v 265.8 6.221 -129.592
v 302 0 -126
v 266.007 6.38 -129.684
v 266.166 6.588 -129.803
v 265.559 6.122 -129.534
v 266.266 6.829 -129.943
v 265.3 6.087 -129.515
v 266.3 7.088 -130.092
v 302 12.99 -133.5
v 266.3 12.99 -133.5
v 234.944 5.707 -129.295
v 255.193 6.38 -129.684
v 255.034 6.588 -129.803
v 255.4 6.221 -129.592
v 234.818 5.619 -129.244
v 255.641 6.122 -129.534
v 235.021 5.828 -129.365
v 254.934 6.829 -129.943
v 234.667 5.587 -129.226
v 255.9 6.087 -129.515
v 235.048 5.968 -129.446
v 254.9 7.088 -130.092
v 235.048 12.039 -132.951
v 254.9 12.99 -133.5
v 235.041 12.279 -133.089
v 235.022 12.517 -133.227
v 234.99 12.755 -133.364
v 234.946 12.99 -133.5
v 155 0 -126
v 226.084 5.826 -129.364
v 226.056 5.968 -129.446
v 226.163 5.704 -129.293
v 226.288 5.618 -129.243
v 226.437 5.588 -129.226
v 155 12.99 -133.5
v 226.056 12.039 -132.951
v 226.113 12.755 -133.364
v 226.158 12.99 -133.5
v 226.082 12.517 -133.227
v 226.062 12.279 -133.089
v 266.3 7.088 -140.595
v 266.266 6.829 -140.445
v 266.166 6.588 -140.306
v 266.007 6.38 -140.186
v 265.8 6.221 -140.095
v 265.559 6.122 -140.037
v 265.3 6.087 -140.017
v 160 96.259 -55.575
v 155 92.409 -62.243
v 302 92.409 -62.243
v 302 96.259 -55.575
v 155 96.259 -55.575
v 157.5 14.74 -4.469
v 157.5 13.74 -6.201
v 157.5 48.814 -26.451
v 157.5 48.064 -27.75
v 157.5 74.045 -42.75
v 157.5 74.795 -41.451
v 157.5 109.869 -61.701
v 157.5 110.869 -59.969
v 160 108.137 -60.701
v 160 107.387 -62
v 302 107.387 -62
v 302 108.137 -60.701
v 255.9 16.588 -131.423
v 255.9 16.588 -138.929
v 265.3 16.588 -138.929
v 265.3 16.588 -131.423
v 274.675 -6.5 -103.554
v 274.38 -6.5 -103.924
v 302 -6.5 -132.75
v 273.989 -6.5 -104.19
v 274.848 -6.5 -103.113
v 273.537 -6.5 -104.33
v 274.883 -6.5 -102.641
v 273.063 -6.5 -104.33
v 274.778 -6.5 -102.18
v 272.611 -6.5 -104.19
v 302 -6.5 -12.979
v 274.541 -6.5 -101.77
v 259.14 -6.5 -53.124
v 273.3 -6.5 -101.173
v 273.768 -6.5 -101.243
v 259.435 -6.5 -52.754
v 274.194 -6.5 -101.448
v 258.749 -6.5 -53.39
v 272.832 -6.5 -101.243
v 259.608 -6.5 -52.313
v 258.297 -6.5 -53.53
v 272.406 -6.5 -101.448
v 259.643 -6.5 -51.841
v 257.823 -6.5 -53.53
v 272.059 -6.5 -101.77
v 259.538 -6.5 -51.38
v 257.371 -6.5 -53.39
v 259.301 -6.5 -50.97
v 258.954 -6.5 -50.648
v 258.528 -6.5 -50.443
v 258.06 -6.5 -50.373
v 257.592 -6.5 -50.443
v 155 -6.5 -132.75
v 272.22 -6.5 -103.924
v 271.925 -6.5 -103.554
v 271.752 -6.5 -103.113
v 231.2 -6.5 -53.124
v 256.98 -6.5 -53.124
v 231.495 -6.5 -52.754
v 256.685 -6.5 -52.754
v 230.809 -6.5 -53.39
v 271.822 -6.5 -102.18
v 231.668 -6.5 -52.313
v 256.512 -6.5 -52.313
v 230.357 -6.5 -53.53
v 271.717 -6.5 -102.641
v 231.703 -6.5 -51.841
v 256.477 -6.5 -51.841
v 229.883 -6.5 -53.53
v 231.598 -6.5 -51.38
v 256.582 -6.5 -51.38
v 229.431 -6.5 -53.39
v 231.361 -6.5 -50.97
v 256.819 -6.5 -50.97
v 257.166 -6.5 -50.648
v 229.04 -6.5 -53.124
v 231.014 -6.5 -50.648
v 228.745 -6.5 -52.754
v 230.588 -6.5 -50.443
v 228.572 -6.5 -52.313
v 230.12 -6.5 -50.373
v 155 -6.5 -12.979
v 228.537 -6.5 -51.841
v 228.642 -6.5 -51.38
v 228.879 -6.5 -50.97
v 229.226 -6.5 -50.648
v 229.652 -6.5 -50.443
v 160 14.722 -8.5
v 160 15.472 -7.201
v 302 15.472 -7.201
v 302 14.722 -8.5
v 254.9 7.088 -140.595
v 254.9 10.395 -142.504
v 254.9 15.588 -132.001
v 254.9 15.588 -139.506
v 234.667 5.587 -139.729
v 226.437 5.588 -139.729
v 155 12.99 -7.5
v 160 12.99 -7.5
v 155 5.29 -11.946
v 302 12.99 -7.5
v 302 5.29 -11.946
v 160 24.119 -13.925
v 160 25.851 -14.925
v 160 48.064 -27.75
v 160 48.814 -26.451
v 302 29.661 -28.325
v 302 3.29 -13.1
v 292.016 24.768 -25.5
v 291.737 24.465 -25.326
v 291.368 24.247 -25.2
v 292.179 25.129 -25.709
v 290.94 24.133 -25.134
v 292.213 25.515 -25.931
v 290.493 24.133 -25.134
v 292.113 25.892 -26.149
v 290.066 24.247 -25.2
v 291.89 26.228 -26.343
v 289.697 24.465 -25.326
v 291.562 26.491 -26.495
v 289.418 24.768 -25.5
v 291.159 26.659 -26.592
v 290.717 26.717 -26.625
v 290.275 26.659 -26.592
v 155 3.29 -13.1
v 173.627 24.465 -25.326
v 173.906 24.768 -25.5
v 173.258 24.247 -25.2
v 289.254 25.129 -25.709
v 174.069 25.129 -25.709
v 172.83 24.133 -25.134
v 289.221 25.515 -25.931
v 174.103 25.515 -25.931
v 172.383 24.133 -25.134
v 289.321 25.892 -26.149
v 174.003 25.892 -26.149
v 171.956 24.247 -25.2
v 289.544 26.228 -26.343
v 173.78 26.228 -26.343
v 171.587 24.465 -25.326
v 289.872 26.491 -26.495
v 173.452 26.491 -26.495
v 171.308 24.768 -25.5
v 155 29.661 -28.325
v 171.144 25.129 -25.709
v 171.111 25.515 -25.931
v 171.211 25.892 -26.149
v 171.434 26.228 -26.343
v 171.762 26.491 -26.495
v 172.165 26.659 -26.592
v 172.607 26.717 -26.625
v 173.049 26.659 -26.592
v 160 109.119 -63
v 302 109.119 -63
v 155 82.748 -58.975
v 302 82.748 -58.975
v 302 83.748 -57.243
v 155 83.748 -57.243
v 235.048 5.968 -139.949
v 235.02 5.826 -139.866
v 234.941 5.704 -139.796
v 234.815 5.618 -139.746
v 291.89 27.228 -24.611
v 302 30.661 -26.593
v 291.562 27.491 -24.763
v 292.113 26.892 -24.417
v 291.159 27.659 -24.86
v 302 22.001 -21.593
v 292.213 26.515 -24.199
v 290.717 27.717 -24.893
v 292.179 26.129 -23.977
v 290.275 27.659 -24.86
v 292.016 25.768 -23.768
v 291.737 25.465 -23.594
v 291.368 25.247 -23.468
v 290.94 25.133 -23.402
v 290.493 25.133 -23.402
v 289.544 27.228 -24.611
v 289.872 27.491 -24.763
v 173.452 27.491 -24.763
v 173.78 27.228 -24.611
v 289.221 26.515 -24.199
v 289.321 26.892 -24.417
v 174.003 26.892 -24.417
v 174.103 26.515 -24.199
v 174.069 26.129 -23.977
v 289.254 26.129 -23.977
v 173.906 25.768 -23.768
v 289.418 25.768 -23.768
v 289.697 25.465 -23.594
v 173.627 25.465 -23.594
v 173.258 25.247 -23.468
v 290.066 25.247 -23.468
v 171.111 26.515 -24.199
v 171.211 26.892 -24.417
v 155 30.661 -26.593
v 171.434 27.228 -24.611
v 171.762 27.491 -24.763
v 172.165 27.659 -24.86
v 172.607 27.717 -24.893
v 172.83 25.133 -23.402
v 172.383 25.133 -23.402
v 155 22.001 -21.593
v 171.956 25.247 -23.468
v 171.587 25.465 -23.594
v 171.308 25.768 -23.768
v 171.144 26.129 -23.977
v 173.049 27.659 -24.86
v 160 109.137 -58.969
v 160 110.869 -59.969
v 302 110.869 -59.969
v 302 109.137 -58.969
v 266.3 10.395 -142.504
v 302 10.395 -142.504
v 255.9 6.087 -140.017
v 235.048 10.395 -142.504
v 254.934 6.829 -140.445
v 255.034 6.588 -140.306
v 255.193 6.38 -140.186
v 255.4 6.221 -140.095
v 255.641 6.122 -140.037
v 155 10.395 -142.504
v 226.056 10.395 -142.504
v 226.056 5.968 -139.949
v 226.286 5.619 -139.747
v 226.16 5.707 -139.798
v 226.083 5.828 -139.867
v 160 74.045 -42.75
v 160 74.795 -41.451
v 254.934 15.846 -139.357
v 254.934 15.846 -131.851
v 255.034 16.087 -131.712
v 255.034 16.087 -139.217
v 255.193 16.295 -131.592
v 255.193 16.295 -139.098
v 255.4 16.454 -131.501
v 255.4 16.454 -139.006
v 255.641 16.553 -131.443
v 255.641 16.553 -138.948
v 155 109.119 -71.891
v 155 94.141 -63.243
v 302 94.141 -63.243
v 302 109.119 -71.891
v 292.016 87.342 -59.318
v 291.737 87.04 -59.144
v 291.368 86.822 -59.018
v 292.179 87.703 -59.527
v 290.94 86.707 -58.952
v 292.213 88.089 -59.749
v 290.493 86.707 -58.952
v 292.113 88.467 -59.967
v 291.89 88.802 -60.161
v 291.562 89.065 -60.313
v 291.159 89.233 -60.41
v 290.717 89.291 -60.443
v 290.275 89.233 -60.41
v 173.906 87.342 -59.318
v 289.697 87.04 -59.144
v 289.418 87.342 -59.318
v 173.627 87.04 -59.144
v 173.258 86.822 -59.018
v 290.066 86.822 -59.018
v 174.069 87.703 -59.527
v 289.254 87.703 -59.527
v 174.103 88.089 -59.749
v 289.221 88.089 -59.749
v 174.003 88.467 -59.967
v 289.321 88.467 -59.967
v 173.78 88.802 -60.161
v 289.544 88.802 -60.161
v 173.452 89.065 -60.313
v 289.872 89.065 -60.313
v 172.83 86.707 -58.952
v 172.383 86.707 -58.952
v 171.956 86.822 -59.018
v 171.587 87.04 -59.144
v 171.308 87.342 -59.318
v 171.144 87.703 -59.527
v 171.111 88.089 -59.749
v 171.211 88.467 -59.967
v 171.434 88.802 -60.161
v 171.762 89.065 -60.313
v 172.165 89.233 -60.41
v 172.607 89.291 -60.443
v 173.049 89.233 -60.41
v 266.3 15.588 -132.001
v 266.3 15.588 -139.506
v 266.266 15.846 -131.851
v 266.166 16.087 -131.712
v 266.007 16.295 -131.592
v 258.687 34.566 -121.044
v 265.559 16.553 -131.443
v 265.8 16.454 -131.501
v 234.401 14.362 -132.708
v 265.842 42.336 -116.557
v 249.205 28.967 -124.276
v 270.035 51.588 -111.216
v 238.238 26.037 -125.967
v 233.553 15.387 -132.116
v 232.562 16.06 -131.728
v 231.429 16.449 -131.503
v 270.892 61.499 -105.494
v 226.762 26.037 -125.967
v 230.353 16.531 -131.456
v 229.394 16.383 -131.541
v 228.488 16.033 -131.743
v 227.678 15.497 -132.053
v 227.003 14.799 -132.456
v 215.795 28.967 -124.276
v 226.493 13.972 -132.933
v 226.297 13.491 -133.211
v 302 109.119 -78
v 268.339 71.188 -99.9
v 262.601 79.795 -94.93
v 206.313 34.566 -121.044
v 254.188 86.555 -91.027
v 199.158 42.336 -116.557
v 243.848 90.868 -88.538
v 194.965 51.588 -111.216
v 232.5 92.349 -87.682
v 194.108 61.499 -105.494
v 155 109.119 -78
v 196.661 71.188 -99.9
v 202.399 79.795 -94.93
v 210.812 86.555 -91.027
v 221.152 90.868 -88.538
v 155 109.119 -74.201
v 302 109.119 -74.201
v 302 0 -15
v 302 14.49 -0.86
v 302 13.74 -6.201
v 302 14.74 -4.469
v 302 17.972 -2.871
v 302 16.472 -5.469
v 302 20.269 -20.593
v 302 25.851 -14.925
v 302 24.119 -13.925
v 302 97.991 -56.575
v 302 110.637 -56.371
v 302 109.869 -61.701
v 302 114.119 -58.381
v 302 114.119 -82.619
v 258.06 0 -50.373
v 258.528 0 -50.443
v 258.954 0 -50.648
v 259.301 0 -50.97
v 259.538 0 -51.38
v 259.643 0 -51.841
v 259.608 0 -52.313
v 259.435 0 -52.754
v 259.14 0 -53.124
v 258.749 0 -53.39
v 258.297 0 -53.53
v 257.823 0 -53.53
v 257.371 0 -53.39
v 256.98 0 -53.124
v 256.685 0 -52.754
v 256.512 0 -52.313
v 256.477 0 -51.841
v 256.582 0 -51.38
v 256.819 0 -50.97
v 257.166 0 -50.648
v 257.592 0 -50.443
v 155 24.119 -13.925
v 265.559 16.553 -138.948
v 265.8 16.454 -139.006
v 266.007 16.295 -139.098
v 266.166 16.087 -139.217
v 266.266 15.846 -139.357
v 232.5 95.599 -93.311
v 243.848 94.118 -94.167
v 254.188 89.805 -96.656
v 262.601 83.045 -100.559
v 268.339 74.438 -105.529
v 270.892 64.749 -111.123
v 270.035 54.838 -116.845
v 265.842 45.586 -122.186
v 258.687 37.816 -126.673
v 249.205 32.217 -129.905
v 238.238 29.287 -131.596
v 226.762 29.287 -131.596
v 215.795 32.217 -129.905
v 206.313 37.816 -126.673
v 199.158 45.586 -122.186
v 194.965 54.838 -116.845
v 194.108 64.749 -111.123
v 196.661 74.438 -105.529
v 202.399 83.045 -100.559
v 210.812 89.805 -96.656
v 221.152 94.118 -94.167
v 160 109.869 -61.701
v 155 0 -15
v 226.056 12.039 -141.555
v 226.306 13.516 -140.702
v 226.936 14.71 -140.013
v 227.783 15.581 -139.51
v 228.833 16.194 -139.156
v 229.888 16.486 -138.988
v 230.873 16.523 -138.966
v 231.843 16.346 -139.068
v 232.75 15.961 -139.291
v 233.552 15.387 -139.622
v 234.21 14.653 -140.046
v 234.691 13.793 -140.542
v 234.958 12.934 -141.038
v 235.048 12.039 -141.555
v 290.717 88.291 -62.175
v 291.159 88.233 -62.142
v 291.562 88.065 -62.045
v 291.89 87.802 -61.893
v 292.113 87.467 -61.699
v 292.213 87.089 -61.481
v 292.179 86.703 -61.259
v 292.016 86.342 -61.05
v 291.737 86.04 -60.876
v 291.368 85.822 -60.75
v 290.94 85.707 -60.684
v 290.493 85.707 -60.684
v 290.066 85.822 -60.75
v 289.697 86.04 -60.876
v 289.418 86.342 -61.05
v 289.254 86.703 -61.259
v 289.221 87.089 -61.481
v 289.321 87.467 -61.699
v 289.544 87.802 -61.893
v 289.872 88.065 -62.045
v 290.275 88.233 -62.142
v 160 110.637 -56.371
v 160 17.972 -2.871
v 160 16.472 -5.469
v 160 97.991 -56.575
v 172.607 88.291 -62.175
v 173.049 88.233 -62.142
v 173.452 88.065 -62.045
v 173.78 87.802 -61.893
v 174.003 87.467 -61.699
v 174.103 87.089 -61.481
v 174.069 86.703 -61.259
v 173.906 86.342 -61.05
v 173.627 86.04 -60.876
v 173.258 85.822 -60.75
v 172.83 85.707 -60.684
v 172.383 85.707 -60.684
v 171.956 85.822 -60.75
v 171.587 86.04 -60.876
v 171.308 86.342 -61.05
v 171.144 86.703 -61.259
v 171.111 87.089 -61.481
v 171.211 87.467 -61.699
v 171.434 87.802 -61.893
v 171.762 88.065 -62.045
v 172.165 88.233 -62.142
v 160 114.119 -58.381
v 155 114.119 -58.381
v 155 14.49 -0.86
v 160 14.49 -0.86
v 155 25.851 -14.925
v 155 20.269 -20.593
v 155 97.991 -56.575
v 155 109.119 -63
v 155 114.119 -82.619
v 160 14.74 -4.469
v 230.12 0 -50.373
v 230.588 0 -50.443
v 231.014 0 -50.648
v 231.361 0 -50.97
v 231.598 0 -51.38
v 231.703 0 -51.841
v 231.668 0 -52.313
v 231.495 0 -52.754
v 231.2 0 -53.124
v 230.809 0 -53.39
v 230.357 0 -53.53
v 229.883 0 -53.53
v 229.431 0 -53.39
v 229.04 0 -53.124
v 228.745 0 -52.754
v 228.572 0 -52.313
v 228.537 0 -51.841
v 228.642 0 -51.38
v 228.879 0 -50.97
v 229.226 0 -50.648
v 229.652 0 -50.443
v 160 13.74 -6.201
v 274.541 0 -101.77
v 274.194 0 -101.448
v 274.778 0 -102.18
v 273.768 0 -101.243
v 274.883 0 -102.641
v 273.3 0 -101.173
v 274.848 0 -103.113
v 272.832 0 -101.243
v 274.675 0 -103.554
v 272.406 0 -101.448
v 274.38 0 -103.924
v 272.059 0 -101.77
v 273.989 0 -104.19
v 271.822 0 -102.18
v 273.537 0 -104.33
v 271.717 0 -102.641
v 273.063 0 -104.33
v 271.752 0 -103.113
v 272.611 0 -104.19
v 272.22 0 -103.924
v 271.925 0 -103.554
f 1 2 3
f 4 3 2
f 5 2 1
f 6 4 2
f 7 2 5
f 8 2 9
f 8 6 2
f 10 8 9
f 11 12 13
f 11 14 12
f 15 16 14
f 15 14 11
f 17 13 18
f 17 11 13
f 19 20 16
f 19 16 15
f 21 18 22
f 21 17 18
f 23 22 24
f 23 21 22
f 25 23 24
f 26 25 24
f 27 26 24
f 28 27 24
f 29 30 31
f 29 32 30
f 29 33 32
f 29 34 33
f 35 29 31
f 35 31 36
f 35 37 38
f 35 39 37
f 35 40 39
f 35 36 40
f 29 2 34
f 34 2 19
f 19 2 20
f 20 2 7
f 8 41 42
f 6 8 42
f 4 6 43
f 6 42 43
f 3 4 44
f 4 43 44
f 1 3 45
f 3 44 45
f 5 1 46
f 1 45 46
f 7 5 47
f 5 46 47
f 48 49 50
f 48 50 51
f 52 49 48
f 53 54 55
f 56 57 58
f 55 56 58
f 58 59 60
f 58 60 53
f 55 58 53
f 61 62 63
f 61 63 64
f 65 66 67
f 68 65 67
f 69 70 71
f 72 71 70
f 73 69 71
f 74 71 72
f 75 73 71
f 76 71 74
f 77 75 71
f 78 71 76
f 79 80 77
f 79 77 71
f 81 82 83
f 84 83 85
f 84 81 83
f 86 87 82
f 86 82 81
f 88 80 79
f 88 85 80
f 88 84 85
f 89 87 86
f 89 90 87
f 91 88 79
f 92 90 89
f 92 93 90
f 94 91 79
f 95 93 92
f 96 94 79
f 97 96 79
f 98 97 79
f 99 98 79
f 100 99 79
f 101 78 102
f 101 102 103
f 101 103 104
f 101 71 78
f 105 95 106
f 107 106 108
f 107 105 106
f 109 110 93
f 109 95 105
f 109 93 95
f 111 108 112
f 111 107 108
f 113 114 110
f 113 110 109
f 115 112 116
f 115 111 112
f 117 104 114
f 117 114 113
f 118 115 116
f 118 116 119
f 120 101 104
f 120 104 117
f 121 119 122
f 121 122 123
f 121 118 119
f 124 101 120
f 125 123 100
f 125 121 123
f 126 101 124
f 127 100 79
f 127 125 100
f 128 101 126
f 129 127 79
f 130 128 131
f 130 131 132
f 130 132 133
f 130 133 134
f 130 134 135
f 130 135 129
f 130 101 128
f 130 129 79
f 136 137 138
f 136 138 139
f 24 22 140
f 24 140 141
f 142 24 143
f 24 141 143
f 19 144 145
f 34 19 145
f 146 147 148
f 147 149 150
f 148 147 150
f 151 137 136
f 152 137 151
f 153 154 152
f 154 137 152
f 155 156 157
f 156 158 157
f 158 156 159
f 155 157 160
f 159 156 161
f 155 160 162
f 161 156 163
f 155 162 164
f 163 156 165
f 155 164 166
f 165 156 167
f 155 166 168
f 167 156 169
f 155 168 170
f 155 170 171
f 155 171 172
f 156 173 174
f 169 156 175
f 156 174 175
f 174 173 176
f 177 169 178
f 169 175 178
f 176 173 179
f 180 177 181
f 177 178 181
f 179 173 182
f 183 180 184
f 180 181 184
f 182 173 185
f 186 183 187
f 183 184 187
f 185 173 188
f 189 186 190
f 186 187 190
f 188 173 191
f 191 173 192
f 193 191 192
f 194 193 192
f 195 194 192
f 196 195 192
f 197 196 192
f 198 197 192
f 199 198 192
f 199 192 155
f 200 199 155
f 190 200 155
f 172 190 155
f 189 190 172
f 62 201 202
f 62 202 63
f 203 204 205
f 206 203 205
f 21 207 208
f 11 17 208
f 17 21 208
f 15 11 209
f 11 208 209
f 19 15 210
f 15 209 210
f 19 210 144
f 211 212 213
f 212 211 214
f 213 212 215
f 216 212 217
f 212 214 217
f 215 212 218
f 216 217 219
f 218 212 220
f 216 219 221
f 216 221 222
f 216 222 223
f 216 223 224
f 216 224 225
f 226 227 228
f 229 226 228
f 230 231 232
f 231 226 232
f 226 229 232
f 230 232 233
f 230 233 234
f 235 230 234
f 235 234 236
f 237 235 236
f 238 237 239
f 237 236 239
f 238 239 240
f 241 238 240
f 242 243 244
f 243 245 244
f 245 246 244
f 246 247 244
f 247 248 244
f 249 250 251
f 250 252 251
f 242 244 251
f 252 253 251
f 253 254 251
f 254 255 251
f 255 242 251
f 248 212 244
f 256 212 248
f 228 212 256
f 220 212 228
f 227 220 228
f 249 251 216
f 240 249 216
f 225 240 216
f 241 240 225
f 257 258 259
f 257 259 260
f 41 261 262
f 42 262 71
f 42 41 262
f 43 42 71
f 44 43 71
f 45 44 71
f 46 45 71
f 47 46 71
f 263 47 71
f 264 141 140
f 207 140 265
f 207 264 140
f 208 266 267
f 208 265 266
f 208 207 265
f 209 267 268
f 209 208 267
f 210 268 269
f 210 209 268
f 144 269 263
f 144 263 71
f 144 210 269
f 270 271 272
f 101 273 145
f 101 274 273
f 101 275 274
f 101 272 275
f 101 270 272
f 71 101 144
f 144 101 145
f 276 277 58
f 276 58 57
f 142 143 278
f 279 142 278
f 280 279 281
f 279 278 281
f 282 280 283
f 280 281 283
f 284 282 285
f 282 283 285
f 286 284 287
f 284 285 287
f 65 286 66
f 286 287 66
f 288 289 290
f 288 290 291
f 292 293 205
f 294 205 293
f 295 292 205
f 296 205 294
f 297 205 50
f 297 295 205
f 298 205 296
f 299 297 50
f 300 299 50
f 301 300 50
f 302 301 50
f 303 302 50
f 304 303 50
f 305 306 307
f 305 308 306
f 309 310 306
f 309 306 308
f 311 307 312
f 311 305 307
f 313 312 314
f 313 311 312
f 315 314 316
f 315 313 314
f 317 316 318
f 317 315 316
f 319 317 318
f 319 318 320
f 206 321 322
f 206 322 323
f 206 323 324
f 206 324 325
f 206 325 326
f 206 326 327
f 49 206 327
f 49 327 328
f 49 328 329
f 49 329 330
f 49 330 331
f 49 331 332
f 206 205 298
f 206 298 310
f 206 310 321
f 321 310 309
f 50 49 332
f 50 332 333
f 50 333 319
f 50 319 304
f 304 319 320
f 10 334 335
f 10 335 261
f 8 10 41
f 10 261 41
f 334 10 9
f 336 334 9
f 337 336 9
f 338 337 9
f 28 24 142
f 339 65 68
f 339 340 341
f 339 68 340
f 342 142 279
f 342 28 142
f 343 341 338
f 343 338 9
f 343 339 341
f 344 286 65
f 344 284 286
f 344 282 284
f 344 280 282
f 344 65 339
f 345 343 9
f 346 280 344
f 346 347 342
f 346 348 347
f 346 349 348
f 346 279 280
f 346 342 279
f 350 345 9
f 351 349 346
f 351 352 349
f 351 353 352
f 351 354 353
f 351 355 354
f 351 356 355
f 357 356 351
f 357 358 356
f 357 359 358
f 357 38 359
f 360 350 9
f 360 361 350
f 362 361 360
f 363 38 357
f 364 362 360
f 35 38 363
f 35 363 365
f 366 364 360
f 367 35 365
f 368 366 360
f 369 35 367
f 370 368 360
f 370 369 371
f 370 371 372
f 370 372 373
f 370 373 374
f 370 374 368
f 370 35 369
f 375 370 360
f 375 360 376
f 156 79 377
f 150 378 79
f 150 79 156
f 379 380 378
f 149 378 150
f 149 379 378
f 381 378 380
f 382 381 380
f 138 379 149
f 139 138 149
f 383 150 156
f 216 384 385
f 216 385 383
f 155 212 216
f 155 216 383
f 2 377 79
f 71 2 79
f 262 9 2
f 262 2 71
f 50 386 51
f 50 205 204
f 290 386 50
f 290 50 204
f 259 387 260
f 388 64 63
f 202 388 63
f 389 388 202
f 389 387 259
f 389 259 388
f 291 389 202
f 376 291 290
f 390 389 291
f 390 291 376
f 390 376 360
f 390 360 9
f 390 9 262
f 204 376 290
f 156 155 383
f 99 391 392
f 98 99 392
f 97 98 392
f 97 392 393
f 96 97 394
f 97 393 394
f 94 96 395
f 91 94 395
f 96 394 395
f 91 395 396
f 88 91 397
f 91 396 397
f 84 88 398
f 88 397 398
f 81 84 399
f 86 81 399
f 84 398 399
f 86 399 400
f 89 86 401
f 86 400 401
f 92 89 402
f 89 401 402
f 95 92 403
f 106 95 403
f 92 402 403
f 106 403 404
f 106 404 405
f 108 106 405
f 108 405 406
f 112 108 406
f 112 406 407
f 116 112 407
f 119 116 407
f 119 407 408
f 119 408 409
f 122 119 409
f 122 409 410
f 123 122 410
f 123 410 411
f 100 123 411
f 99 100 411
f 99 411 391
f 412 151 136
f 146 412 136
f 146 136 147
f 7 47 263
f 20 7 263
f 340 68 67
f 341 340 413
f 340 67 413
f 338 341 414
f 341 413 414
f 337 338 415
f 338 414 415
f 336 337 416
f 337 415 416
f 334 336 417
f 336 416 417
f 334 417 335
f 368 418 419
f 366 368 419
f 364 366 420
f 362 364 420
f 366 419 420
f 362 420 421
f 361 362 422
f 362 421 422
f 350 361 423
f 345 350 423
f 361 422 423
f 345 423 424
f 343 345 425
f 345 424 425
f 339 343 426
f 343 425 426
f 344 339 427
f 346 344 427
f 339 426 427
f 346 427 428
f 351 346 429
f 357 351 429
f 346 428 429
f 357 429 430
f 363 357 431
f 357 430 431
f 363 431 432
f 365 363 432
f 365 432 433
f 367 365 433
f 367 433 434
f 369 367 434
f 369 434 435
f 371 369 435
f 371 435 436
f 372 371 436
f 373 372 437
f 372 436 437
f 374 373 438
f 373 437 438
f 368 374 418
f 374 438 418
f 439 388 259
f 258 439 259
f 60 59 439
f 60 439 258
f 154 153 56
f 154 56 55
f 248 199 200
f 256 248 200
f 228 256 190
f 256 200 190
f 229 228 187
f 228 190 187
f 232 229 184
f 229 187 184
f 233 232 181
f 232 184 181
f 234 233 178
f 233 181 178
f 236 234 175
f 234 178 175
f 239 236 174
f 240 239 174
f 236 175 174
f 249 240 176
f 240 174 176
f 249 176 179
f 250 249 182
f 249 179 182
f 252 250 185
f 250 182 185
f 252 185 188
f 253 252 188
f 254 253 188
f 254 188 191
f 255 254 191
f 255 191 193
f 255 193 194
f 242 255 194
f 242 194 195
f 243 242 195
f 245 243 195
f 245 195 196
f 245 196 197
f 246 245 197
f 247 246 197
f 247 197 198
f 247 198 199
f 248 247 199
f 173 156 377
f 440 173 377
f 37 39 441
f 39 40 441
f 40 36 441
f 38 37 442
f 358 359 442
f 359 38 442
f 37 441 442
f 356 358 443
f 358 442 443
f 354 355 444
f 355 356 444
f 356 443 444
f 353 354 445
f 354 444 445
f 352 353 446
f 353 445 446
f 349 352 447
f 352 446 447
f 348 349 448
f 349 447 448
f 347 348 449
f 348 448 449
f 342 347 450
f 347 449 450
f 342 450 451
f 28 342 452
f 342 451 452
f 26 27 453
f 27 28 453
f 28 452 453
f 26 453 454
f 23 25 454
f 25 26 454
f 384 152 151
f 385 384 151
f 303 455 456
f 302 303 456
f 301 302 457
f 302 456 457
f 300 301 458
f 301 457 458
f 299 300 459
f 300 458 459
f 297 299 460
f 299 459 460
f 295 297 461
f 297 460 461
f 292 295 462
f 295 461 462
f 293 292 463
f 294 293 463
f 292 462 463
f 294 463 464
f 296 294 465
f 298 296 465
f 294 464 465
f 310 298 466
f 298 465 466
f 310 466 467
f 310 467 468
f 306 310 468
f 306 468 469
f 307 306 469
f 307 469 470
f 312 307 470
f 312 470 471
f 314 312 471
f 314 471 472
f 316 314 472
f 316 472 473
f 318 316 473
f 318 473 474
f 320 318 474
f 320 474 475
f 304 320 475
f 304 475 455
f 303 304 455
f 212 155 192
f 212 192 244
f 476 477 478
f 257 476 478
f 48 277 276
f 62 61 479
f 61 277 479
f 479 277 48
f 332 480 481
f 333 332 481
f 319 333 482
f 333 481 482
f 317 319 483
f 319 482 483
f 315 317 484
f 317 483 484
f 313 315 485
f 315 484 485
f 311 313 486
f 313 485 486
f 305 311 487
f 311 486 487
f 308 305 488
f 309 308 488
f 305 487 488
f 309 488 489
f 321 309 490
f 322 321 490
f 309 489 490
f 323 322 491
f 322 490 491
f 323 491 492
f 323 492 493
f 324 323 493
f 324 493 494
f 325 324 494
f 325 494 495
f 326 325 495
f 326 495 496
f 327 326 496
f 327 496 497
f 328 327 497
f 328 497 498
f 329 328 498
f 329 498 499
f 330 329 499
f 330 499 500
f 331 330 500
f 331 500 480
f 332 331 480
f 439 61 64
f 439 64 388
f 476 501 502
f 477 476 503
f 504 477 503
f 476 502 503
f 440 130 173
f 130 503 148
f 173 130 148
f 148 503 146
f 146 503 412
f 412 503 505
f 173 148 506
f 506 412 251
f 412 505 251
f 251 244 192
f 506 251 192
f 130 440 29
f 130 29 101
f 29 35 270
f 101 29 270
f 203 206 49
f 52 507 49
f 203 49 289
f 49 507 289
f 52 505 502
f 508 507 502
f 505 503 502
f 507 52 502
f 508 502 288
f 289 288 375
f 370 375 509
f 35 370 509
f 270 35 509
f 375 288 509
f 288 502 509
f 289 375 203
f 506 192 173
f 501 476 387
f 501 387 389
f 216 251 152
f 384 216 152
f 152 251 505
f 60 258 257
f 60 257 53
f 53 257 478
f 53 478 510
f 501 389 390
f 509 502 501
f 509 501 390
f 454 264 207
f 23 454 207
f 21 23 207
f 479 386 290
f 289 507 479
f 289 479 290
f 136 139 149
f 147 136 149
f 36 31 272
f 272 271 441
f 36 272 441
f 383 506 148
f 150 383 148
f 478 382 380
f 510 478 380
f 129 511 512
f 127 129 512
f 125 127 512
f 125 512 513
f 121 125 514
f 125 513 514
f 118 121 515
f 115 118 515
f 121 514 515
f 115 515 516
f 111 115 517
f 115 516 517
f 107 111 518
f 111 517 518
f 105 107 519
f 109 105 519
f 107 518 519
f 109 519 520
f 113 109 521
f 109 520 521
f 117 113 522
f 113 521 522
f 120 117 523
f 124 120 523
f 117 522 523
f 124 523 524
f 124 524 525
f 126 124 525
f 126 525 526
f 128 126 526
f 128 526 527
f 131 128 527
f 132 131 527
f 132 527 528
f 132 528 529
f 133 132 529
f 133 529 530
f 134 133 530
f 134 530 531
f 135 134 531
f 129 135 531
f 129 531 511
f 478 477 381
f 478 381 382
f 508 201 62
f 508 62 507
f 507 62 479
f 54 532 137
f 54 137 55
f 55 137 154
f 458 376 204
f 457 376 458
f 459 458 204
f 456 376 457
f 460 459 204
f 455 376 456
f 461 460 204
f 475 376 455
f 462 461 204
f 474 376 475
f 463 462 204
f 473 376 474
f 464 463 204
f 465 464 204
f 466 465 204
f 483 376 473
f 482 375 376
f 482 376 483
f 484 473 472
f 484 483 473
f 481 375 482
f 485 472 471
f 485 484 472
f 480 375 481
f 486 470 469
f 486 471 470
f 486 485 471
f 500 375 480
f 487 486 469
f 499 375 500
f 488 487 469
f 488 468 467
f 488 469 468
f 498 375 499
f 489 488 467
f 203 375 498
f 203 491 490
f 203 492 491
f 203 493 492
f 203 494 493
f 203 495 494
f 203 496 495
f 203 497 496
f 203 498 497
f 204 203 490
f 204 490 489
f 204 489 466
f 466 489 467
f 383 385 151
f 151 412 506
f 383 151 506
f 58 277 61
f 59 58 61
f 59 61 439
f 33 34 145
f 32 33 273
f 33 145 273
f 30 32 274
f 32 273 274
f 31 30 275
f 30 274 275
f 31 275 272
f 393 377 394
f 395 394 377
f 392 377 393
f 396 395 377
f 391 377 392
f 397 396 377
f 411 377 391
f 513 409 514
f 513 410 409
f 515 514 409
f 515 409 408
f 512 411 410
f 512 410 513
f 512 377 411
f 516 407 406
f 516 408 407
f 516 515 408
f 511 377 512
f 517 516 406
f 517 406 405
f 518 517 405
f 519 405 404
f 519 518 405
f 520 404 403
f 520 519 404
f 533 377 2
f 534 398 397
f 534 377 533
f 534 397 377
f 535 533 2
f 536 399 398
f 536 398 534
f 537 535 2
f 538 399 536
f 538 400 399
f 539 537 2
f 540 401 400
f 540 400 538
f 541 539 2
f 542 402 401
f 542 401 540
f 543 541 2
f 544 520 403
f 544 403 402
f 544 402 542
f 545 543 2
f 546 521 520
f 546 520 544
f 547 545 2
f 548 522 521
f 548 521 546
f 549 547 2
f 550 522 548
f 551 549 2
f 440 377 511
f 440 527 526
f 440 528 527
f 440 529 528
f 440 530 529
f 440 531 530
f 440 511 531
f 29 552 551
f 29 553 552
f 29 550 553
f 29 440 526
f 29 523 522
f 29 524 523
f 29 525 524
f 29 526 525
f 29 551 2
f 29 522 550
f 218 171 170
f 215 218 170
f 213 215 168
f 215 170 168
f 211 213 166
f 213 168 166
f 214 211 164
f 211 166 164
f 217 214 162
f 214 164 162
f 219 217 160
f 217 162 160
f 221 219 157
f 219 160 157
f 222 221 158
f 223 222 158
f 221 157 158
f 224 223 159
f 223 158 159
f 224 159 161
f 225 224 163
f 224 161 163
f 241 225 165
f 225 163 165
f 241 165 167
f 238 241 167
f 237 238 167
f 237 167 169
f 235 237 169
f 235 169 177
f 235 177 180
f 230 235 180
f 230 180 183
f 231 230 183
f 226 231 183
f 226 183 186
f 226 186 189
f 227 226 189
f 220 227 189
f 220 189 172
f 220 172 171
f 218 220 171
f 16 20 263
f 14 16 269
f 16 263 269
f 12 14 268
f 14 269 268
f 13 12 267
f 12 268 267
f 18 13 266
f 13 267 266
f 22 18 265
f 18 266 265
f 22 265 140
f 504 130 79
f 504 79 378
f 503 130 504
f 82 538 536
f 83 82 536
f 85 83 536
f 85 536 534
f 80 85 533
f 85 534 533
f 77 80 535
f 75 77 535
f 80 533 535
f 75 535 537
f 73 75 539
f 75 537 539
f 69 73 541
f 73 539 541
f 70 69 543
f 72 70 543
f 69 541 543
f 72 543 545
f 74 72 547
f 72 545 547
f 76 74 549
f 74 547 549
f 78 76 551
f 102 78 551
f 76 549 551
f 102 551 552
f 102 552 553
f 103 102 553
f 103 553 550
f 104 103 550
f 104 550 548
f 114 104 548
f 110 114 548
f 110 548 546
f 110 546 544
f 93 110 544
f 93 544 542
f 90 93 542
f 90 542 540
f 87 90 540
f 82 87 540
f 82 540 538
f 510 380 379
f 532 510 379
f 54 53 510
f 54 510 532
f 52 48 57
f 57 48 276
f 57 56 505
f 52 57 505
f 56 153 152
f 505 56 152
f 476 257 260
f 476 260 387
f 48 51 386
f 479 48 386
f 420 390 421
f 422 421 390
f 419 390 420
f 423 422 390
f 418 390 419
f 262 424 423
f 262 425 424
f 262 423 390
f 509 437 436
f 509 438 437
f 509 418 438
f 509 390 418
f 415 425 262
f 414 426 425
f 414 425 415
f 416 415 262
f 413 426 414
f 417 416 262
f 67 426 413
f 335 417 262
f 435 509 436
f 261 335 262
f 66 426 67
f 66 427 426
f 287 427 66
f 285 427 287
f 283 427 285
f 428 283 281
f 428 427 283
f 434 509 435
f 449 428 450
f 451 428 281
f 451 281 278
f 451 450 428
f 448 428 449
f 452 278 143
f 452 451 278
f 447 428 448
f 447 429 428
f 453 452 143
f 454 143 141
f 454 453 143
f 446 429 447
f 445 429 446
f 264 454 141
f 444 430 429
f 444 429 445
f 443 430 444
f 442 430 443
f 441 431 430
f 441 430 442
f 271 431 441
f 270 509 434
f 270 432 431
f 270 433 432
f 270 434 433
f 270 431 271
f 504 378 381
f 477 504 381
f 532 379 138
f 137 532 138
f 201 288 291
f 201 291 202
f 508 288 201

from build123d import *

# Parameters (mm, degrees)
BOSS_EXTRUDE1_DEPTH = 155
SKETCH4_W           = 144
SKETCH4_H           = 111
CUT_EXTRUDE1_DEPTH  = 5
SKETCH5_R           = 38.5
CUT_EXTRUDE2_DEPTH  = 10
BOSS_EXTRUDE2_DEPTH = 5
CUT_EXTRUDE3_DEPTH  = 5
CUT_EXTRUDE4_DEPTH  = 2.5
CUT_EXTRUDE5_DEPTH  = 2.5
BOSS_EXTRUDE3_DEPTH = 142
SKETCH12_R          = 38.5
CUT_EXTRUDE6_DEPTH  = 6.5
BOSS_EXTRUDE4_DEPTH = 147
CUT_EXTRUDE7_DEPTH  = 25
SKETCH16_R          = 1.5
CUT_EXTRUDE8_DEPTH  = 5
SKETCH17_R          = 1.5875
CUT_EXTRUDE9_DEPTH  = 10


with BuildPart() as part:
    # Sketch3 → Boss-Extrude1 (new body)
    with BuildSketch(Plane(origin=(0, 0, 0), x_dir=(0, 0, -1), z_dir=(1, 0, 0))):
        Polygon((58.381197846, 114.119200877), (0.860471904, 14.490381057), (12.979274058, -6.5), (132.75, -6.5), (142.504165125, 10.394709581), (82.618802154, 114.119200877), align=None)
        Polygon((7.5, 12.990381057), (15, 0), (15, -1.5), (126, -1.5), (126, 0), (133.5, 12.990381057), (134.799038106, 13.740381057), (79.299038106, 109.869200877), (78, 109.119200877), (63, 109.119200877), (61.700961894, 109.869200877), (6.200961894, 13.740381057), align=None, mode=Mode.SUBTRACT)
    extrude(amount=BOSS_EXTRUDE1_DEPTH)

    # Sketch4 → Cut-Extrude1 (cut)
    with BuildSketch(Plane(origin=(0, 3.25, 5.629165125), x_dir=(1, 0, 0), z_dir=(0, 0.4999999999999995, 0.8660254037844389))):
        with Locations((77.5, 70.5)):
            Rectangle(SKETCH4_W, SKETCH4_H)
    extrude(amount=-CUT_EXTRUDE1_DEPTH, mode=Mode.SUBTRACT)

    # Sketch5 → Cut-Extrude2 (cut)
    with BuildSketch(Plane(origin=(0, 64.304790967, -111.379165125), x_dir=(-1, 0, 0), z_dir=(0, 0.5000000000000006, -0.8660254037844385))):
        with Locations(Location((-77.5, -2.364637029, 0), (0, 0, 90))):
            Circle(SKETCH5_R)
    extrude(amount=-CUT_EXTRUDE2_DEPTH, mode=Mode.SUBTRACT)


with BuildPart() as body_2:
    # Sketch6 → Boss-Extrude2 (new body)
    with BuildSketch(Plane(origin=(155, 0, 0), x_dir=(0, 0, -1), z_dir=(1, 0, 0))):
        Polygon((82.618802154, 114.119200877), (58.381197846, 114.119200877), (0.860471904, 14.490381057), (12.979274058, -6.5), (132.75, -6.5), (142.504165125, 10.394709581), align=None)
    extrude(amount=BOSS_EXTRUDE2_DEPTH)

    # Sketch7 → Cut-Extrude3 (cut)
    with BuildSketch(Plane(origin=(160, 0, 0), x_dir=(0, 0, -1), z_dir=(1, 0, 0))):
        Polygon((63, 109.119200877), (7.5, 12.990381057), (15, 0), (126, 0), (133.5, 12.990381057), (78, 109.119200877), align=None)
    extrude(amount=-CUT_EXTRUDE3_DEPTH, mode=Mode.SUBTRACT)

    # Sketch8 → Cut-Extrude4 (cut)
    with BuildSketch(Plane(origin=(160, 0, 0), x_dir=(0, 0, -1), z_dir=(1, 0, 0))):
        Polygon((6.200961894, 13.740381057), (61.700961894, 109.869200877), (59.968911087, 110.869200877), (4.468911087, 14.740381057), align=None)
    extrude(amount=-CUT_EXTRUDE4_DEPTH, mode=Mode.SUBTRACT)

    # Sketch10 → Cut-Extrude5 (cut)
    with BuildSketch(Plane(origin=(160, 0, 0), x_dir=(0, 0, -1), z_dir=(1, 0, 0))):
        Polygon((42.75, 74.045172024), (27.75, 48.06440991), (26.450961894, 48.81440991), (41.450961894, 74.795172024), align=None)
    extrude(amount=-CUT_EXTRUDE5_DEPTH, mode=Mode.SUBTRACT)

    # Sketch11 → Boss-Extrude3 (add)
    with BuildSketch(Plane(origin=(160, 0, 0), x_dir=(0, 0, -1), z_dir=(1, 0, 0))):
        Polygon((63, 109.119200877), (62, 107.387150069), (60.700961894, 108.137150069), (61.700961894, 109.869200877), (59.968911087, 110.869200877), (58.968911087, 109.137150069), (56.370834875, 110.637150069), (58.381197846, 114.119200877), (82.618802154, 114.119200877), (142.504165125, 10.394709581), (132.75, -6.5), (12.979274058, -6.5), (0.860471904, 14.490381057), (2.870834875, 17.972431864), (5.468911087, 16.472431864), (4.468911087, 14.740381057), (6.200961894, 13.740381057), (7.200961894, 15.472431864), (8.5, 14.722431864), (7.5, 12.990381057), (15, 0), (126, 0), (133.5, 12.990381057), (78, 109.119200877), align=None)
    extrude(amount=BOSS_EXTRUDE3_DEPTH)

    # Sketch12 → Cut-Extrude6 (cut)
    with BuildSketch(Plane(origin=(0, 64.304790967, -111.379165125), x_dir=(-1, 0, 0), z_dir=(0, 0.5000000000000006, -0.8660254037844384))):
        with Locations(Location((-232.5, -2.364637029, 0), (0, 0, 90))):
            Circle(SKETCH12_R)
    extrude(amount=-CUT_EXTRUDE6_DEPTH, mode=Mode.SUBTRACT)

    # Sketch13 → Boss-Extrude4 (add)
    with BuildSketch(Plane.ZY.offset(-155)):
        Polygon((-26.593395609, 30.661112341), (-21.593395609, 22.000858303), (-14.925, 25.850858303), (-13.925, 24.118807495), (-20.593395609, 20.268807495), (-11.945597073, 5.290381057), (-13.100297611, 3.290381057), (-28.325446417, 29.661112341), align=None)
        Polygon((-62.243395609, 92.408723631), (-55.575, 96.258723631), (-56.575, 97.990774438), (-63.243395609, 94.140774438), (-71.891194146, 109.119200877), (-74.200595222, 109.119200877), (-58.975446417, 82.748469593), (-57.243395609, 83.748469593), align=None)
    extrude(amount=-BOSS_EXTRUDE4_DEPTH)

    # Sketch14 → Cut-Extrude7 (cut)
    with BuildSketch(Plane.XY.offset(-150)):
        with BuildLine():
            Line((234.6666, 5.5875), (226.437, 5.5875))
            ThreePointArc((226.437, 5.5875), (226.167592316, 5.699092316), (226.056, 5.9685))
            Line((226.056, 5.9685), (226.056, 12.0391))
            ThreePointArc((226.056, 12.0391), (230.5518, 16.5349), (235.0476, 12.0391))
            Line((235.0476, 12.0391), (235.0476, 5.9685))
            ThreePointArc((235.0476, 5.9685), (234.936007684, 5.699092316), (234.6666, 5.5875))
        make_face()
        with BuildLine():
            Line((265.299934, 6.0875), (255.899934, 6.0875))
            ThreePointArc((255.899934, 6.0875), (255.192827219, 6.380393219), (254.899934, 7.0875))
            Line((254.899934, 7.0875), (254.899934, 15.5875))
            ThreePointArc((254.899934, 15.5875), (255.192827219, 16.294606781), (255.899934, 16.5875))
            Line((255.899934, 16.5875), (265.299934, 16.5875))
            ThreePointArc((265.299934, 16.5875), (266.007040781, 16.294606781), (266.299934, 15.5875))
            Line((266.299934, 15.5875), (266.299934, 7.0875))
            ThreePointArc((266.299934, 7.0875), (266.007040781, 6.380393219), (265.299934, 6.0875))
        make_face()
    extrude(amount=CUT_EXTRUDE7_DEPTH, mode=Mode.SUBTRACT)

    # Sketch16 → Cut-Extrude8 (cut)
    with BuildSketch(Plane(origin=(0, -4.85, -8.400446417), x_dir=(-1, 0, 0), z_dir=(0, -0.4999999999999997, -0.8660254037844389))):
        with Locations(Location((-172.60681079, 106.05, 0), (0, 0, 90))):
            Circle(SKETCH16_R)
        with Locations(Location((-172.60681079, 34.95, 0), (0, 0, 90))):
            Circle(SKETCH16_R)
        with Locations(Location((-290.71681079, 106.05, 0), (0, 0, 90))):
            Circle(SKETCH16_R)
        with Locations(Location((-290.71681079, 34.95, 0), (0, 0, 90))):
            Circle(SKETCH16_R)
    extrude(amount=-CUT_EXTRUDE8_DEPTH, mode=Mode.SUBTRACT)

    # Sketch17 → Cut-Extrude9 (cut)
    with BuildSketch(Plane(origin=(0, 0, 0), x_dir=(1, 0, 0), z_dir=(0, 1, 0))):
        with Locations(Location((230.12, 51.9601016, 0), (0, 0, 270))):
            Circle(SKETCH17_R)
        with Locations(Location((258.06, 51.9601016, 0), (0, 0, 270))):
            Circle(SKETCH17_R)
        with Locations(Location((273.3, 102.7601016, 0), (0, 0, 270))):
            Circle(SKETCH17_R)
    extrude(amount=-CUT_EXTRUDE9_DEPTH, mode=Mode.SUBTRACT)


solid = body_2.part
